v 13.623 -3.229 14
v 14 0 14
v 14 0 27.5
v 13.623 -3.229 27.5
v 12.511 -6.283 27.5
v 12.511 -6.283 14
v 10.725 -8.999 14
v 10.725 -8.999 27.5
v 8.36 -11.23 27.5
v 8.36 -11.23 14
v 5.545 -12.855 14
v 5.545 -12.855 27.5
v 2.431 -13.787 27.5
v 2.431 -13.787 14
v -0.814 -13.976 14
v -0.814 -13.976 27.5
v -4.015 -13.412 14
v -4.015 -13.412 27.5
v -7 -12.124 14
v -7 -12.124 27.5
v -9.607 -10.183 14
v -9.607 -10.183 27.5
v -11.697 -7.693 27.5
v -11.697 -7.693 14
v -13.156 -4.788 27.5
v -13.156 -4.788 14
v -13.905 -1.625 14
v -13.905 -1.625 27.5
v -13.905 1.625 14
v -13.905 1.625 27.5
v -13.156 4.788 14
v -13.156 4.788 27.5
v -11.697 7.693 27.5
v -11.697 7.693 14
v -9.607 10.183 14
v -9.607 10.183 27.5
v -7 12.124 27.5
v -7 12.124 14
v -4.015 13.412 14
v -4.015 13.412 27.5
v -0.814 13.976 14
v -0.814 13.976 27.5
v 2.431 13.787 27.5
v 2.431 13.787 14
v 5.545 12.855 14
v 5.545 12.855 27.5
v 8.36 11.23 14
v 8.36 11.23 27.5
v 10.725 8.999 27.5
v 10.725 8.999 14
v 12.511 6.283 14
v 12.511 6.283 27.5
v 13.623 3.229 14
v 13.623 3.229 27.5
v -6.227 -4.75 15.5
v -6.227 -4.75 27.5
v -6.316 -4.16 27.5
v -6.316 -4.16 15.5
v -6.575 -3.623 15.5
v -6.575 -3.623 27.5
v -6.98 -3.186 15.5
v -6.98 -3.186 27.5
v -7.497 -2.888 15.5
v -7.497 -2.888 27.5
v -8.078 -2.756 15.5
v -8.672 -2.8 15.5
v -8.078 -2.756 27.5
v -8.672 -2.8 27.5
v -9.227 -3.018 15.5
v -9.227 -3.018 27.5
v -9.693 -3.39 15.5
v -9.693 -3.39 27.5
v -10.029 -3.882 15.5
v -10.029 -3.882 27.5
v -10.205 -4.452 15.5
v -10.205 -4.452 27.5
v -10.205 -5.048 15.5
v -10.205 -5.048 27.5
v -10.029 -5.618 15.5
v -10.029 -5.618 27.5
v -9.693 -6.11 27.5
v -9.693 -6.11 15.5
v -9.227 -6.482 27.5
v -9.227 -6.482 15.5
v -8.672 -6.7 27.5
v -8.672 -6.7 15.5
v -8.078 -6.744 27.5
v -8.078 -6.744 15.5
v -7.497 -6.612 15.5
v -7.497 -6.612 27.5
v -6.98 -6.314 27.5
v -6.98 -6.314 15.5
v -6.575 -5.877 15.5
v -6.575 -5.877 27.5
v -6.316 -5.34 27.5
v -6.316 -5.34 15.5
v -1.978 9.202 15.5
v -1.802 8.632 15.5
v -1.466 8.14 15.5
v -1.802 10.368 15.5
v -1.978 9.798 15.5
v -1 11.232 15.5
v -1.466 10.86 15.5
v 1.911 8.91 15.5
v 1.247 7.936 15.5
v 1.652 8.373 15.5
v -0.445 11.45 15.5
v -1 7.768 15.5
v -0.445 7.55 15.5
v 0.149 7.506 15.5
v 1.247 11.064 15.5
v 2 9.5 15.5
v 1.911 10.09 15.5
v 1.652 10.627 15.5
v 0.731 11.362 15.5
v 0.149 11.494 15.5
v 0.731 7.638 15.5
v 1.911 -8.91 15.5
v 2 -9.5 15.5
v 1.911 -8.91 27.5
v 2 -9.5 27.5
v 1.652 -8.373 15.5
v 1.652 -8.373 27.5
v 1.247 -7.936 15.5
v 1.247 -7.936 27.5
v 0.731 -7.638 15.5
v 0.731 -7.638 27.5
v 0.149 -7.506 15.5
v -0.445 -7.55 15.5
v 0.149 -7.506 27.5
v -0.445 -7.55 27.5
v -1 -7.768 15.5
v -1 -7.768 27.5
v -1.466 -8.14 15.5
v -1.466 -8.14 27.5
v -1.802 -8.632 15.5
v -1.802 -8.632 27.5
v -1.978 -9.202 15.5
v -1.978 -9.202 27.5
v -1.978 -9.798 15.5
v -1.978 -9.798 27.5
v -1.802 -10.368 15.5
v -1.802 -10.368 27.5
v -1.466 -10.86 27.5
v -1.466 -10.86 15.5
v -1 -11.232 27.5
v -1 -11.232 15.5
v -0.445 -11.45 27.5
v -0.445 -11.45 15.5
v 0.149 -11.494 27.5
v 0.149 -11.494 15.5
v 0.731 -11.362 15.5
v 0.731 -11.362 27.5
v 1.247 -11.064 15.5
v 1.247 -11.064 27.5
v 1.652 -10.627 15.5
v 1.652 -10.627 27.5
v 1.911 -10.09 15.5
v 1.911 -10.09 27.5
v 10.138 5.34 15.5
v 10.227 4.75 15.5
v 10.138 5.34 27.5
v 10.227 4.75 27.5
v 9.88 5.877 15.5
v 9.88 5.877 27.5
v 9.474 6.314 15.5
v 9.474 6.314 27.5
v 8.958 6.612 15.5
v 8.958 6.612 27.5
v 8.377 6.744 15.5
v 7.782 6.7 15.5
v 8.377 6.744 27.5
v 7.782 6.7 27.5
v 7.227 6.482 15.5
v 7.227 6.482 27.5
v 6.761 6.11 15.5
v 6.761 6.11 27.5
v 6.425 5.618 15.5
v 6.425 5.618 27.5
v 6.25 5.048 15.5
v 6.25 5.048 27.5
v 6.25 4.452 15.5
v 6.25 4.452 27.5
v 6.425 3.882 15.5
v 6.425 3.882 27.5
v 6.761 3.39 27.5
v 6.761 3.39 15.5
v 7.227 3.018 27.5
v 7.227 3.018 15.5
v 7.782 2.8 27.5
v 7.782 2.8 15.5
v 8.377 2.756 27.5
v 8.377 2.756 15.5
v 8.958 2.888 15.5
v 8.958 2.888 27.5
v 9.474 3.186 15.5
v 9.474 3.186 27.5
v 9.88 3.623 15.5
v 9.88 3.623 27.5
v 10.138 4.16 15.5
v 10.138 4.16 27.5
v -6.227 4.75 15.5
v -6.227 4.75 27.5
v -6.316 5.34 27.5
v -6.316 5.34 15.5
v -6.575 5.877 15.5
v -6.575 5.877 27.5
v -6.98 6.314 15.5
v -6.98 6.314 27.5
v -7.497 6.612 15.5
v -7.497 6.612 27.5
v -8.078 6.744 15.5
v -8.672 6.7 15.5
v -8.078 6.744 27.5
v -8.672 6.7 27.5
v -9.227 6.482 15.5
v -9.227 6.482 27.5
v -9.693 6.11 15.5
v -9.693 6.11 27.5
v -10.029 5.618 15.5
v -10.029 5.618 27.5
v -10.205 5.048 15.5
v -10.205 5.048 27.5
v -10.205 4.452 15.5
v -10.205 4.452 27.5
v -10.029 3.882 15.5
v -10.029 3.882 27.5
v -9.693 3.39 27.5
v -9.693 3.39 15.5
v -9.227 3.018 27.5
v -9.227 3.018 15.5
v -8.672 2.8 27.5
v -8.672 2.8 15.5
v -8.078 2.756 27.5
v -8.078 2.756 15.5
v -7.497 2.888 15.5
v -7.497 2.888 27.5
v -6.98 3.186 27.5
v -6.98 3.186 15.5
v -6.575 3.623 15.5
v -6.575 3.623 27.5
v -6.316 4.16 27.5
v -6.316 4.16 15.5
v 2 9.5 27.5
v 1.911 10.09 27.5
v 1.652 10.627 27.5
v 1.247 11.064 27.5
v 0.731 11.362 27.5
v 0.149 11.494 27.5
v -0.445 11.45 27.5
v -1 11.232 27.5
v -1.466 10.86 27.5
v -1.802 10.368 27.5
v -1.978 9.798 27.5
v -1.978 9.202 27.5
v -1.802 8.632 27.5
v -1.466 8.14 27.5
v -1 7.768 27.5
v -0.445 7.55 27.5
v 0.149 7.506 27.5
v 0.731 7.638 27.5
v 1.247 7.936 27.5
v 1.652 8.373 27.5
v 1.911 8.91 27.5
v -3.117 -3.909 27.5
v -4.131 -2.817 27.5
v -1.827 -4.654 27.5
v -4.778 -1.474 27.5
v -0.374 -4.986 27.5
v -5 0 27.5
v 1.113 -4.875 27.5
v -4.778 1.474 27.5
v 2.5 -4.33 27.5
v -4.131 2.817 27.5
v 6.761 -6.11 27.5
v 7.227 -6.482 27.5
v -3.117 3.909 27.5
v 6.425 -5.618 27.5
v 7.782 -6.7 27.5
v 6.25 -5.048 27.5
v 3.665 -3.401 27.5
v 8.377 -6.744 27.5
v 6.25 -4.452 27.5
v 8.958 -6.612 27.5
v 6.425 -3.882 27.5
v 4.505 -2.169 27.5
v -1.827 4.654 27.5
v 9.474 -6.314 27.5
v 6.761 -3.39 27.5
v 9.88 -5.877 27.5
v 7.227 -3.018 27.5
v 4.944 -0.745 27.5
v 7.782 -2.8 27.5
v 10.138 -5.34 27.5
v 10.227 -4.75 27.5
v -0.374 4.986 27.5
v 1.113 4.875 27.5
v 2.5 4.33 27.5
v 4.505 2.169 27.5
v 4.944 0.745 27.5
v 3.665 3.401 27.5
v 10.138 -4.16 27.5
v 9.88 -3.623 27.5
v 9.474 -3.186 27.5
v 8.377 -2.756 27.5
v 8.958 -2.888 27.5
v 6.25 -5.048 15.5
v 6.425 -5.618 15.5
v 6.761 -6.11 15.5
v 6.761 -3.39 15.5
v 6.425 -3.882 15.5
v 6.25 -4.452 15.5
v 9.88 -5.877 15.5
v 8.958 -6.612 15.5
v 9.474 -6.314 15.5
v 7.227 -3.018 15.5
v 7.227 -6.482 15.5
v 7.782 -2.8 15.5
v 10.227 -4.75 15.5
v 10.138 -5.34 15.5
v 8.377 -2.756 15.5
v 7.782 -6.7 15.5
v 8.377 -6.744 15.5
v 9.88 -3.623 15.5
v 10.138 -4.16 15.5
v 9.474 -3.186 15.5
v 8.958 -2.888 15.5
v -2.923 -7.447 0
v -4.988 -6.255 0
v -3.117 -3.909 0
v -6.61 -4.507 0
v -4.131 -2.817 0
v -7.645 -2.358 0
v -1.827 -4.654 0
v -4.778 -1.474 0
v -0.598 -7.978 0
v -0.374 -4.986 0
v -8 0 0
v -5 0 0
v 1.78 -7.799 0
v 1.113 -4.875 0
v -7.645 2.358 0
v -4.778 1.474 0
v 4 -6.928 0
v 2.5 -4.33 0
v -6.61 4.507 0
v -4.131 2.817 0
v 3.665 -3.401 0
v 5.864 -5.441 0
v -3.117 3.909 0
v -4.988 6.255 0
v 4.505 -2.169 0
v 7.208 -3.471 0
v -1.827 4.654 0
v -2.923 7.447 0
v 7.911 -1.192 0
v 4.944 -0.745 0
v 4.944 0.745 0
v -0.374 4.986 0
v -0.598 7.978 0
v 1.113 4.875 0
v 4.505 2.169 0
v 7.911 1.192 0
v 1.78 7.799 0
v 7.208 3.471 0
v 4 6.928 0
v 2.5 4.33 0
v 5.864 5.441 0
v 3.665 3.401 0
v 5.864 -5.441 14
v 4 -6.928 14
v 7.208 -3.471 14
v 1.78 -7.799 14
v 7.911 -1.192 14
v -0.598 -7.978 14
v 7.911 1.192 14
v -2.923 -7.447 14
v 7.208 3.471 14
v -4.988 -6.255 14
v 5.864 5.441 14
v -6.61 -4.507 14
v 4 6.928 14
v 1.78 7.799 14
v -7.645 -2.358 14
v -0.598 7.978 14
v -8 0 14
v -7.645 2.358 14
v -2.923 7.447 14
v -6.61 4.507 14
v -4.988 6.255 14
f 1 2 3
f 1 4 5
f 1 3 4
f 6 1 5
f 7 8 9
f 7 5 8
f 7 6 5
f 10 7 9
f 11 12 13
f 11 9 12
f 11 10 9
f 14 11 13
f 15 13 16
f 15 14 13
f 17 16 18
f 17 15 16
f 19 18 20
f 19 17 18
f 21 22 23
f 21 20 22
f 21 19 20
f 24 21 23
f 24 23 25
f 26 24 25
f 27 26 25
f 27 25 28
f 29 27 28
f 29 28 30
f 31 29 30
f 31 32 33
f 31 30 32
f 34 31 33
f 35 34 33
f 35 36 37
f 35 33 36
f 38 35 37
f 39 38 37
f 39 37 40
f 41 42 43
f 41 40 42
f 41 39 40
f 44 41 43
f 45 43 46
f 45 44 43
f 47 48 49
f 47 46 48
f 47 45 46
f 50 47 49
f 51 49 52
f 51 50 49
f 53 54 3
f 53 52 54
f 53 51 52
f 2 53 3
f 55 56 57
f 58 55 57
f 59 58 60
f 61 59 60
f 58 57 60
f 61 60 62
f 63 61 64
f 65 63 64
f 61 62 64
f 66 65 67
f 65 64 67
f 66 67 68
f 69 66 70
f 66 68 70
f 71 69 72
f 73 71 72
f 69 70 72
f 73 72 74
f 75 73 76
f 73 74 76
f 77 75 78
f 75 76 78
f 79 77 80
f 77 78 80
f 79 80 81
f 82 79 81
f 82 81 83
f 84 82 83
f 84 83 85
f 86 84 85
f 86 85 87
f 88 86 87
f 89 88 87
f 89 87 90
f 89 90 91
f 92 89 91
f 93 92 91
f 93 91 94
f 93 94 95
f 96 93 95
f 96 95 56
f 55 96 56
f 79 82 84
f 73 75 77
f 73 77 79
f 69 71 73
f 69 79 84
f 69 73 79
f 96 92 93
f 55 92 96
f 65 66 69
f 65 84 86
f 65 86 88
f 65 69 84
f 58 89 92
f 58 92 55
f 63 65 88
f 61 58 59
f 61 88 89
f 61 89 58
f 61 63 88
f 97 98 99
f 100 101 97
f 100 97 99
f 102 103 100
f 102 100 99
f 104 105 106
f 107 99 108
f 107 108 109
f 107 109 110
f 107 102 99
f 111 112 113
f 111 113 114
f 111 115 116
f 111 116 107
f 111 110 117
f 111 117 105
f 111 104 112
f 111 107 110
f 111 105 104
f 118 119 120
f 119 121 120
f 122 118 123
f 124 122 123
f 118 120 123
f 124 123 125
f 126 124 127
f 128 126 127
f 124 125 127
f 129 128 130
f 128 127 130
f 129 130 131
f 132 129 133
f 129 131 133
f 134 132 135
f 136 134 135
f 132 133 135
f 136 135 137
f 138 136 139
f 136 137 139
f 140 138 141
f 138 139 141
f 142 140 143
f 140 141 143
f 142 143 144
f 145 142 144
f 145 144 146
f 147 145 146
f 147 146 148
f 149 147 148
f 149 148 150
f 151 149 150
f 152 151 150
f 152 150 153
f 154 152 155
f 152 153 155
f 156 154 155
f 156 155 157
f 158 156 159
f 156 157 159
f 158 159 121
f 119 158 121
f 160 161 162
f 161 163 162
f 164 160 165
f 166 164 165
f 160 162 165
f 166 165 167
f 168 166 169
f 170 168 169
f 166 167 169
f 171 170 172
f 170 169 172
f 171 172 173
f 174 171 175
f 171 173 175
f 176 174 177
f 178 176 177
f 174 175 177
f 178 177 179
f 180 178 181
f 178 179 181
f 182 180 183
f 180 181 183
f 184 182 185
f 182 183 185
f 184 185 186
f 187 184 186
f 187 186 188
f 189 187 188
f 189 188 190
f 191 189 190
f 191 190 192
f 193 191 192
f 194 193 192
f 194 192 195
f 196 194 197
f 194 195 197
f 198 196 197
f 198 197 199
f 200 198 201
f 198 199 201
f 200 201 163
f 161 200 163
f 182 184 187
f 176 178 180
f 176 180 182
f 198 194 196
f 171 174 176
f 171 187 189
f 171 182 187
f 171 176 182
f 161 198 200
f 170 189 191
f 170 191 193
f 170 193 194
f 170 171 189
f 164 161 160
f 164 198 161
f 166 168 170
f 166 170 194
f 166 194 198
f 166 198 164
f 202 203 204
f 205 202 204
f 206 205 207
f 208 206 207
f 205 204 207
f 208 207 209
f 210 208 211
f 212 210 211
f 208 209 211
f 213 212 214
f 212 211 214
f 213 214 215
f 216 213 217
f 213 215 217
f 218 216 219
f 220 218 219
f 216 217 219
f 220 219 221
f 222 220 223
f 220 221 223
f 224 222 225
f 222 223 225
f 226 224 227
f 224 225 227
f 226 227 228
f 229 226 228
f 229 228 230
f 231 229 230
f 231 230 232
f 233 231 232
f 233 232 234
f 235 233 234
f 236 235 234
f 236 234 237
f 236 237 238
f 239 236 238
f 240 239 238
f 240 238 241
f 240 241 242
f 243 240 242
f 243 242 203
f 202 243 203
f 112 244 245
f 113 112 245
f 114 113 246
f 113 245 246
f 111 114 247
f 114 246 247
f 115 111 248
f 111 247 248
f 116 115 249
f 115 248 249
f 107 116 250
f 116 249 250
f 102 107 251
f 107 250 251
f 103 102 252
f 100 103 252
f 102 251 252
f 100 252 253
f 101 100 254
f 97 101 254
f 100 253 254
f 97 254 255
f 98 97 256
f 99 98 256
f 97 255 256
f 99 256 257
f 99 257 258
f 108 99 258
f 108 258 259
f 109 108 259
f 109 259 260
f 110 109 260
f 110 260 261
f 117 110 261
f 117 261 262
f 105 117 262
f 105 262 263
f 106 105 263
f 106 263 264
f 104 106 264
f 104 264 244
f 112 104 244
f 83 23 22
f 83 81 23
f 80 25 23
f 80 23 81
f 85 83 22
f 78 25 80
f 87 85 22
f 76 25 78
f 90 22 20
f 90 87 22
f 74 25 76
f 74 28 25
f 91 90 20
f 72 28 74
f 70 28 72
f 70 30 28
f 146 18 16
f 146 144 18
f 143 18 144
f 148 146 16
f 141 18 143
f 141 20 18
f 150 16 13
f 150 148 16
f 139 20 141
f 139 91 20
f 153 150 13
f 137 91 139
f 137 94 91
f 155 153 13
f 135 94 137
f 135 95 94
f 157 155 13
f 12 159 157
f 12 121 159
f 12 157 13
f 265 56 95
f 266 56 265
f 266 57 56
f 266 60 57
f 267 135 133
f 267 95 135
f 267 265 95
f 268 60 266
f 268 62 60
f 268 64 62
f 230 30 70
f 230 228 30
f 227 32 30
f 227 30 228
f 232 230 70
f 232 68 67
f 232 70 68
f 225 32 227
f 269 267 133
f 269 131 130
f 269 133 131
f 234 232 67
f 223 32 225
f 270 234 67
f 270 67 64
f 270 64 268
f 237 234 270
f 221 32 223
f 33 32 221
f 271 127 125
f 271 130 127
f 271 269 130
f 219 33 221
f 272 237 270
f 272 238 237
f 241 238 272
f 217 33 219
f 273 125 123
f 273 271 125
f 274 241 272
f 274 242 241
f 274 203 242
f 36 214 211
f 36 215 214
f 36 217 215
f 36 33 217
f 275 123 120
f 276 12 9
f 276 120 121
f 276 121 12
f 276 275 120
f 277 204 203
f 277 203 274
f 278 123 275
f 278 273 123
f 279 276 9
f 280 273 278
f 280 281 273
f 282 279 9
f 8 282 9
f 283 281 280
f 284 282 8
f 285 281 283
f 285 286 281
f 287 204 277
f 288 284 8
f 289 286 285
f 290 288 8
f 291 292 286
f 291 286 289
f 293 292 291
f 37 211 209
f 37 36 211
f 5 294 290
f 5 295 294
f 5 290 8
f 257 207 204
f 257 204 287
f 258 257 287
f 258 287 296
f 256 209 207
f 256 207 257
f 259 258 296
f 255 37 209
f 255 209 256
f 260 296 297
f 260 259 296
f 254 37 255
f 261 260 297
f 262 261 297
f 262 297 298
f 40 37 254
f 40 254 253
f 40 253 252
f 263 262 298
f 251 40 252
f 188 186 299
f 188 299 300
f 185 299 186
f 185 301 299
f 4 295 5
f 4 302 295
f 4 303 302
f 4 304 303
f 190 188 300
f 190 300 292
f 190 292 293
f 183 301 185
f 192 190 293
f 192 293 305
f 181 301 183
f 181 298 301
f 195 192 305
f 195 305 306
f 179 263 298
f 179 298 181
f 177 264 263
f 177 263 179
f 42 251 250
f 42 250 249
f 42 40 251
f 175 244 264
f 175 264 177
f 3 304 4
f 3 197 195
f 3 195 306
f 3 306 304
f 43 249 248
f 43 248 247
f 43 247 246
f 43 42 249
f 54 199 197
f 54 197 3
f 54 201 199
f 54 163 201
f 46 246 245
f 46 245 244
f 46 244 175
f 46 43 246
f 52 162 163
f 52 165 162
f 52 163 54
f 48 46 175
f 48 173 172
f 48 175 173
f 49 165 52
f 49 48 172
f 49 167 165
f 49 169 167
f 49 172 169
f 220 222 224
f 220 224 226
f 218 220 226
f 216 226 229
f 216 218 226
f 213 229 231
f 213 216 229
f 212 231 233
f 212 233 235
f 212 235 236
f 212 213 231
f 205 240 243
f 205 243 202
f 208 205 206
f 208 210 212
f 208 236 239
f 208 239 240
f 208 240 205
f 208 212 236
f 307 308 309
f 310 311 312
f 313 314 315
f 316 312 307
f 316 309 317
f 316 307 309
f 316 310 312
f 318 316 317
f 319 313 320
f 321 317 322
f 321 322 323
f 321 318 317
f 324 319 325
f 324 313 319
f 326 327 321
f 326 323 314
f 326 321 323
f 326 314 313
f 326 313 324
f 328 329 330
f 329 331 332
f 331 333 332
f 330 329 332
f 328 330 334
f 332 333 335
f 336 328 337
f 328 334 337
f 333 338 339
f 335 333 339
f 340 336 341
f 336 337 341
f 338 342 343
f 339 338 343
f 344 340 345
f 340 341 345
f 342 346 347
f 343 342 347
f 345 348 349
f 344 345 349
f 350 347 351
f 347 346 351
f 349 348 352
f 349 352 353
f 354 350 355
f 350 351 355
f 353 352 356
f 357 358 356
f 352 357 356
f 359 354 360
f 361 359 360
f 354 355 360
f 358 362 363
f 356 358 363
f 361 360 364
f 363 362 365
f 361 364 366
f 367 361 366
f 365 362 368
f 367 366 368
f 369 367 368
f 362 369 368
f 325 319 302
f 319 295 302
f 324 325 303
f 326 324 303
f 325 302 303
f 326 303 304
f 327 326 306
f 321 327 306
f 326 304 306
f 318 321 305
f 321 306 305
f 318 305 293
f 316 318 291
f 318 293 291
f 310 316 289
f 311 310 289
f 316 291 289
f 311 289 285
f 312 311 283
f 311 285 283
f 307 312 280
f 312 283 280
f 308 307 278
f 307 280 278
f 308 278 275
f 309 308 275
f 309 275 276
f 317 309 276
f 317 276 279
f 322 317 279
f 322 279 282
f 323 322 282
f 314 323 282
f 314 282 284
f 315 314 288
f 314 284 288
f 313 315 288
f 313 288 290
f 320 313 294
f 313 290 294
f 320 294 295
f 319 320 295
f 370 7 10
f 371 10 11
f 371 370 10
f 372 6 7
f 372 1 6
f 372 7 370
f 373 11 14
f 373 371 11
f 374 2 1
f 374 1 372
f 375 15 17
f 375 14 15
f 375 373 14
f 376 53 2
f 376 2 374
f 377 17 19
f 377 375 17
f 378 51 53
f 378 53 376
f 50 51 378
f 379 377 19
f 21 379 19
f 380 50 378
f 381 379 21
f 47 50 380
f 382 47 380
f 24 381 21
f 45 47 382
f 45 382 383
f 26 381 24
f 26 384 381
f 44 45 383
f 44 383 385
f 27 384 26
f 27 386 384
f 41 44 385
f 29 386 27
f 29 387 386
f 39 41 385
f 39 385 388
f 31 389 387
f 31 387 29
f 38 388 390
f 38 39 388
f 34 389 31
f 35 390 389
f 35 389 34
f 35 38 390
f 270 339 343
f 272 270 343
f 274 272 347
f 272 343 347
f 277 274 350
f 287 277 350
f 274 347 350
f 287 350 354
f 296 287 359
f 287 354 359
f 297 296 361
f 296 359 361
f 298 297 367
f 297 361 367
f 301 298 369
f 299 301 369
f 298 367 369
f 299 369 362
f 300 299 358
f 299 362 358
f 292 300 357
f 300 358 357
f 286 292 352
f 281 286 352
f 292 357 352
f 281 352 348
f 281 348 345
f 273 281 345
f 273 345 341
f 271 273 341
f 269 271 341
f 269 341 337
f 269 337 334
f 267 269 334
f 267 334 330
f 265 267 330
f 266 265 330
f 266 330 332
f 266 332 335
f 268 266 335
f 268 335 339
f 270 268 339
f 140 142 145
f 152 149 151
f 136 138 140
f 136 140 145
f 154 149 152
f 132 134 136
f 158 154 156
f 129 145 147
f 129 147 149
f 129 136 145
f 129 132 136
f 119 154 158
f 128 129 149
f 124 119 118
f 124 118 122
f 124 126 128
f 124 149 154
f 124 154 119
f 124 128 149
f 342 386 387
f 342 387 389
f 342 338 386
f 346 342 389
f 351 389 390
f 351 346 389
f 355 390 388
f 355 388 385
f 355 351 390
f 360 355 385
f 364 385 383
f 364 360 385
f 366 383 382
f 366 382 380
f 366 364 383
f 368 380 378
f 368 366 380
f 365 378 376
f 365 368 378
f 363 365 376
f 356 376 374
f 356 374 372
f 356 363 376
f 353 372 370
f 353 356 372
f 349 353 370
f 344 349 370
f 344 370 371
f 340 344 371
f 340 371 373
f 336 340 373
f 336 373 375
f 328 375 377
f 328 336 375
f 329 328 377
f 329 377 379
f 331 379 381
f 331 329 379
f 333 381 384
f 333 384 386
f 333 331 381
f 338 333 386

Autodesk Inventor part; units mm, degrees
ref_plane "YZ Plane" through (0, 0, 0) normal (1, 0, 0) x (0, 1, 0)
ref_plane "XZ Plane" through (0, 0, 0) normal (0, 1, 0) x (-1, 0, 0)
ref_plane "XY Plane" through (0, 0, 0) normal (0, 0, 1) x (1, 0, 0)
sketch "Szkic1" plane through (0, 0, 0) normal (0, 0, 1) x (1, 0, 0)
  circle A0 centre (0, 0) radius 14
  dimension "d0" = 28
extrude "Wyciągnięcie proste1" add sketch "Szkic1" along normal blind 27.5
sketch "Szkic2" plane through (0, 0, 0) normal (0, 0, -1) x (-1, 0, 0)
  circle A0 centre (0, 0) radius 8
  circle A1 centre (0, 0) radius 14 projected
  dimension "d3" = 16
extrude "Wyciągnięcie proste2" cut sketch "Szkic2" against normal blind 14
sketch "Szkic3" plane through (0, 0, 0) normal (0, 0, -1) x (-1, 0, 0)
  circle A0 centre (0, 0) radius 8 projected
  circle A1 centre (0, 0) radius 5
  dimension "d6" = 10
extrude "Wyciągnięcie proste3" cut sketch "Szkic3" against normal up to next contours A1
sketch "Szkic4" plane through (0, 0, 27.5) normal (0, 0, 1) x (1, 0, 0)
  line L0 (0, 0) -> (0, 9.5)
  circle A0 centre (0, 9.5) radius 2
  circle A1 centre (0, 0) radius 14 projected
  circle A2 centre (8.2272, 4.75) radius 2
  circle A3 centre (8.2272, -4.75) radius 2
  circle A4 centre (0, -9.5) radius 2
  circle A5 centre (-8.2272, -4.75) radius 2
  circle A6 centre (-8.2272, 4.75) radius 2
  dimension "d9" = 9.5
  dimension "d10" = 4
  dimension "d13" = 360
extrude "Wyciągnięcie proste4" cut sketch "Szkic4" against normal blind 12 contours A0 | A2 | A3 | A4 | A5 | A6
thread "Gwint1" size "M4x0.7" class "6H" standard "ANSI Metric M Profile" full length
thread "Gwint2" size "M4x0.7" class "6H" standard "ANSI Metric M Profile" full length
thread "Gwint3" size "M4x0.7" class "6H" standard "ANSI Metric M Profile" full length
thread "Gwint4" size "M4x0.7" class "6H" standard "ANSI Metric M Profile" full length
thread "Gwint5" size "M4x0.7" class "6H" standard "ANSI Metric M Profile" full length
thread "Gwint6" size "M4x0.7" class "6H" standard "ANSI Metric M Profile" full length
properties part number "Tuleja zaciskowo rozprężna RCK BK 80 10x16 Clampex"
